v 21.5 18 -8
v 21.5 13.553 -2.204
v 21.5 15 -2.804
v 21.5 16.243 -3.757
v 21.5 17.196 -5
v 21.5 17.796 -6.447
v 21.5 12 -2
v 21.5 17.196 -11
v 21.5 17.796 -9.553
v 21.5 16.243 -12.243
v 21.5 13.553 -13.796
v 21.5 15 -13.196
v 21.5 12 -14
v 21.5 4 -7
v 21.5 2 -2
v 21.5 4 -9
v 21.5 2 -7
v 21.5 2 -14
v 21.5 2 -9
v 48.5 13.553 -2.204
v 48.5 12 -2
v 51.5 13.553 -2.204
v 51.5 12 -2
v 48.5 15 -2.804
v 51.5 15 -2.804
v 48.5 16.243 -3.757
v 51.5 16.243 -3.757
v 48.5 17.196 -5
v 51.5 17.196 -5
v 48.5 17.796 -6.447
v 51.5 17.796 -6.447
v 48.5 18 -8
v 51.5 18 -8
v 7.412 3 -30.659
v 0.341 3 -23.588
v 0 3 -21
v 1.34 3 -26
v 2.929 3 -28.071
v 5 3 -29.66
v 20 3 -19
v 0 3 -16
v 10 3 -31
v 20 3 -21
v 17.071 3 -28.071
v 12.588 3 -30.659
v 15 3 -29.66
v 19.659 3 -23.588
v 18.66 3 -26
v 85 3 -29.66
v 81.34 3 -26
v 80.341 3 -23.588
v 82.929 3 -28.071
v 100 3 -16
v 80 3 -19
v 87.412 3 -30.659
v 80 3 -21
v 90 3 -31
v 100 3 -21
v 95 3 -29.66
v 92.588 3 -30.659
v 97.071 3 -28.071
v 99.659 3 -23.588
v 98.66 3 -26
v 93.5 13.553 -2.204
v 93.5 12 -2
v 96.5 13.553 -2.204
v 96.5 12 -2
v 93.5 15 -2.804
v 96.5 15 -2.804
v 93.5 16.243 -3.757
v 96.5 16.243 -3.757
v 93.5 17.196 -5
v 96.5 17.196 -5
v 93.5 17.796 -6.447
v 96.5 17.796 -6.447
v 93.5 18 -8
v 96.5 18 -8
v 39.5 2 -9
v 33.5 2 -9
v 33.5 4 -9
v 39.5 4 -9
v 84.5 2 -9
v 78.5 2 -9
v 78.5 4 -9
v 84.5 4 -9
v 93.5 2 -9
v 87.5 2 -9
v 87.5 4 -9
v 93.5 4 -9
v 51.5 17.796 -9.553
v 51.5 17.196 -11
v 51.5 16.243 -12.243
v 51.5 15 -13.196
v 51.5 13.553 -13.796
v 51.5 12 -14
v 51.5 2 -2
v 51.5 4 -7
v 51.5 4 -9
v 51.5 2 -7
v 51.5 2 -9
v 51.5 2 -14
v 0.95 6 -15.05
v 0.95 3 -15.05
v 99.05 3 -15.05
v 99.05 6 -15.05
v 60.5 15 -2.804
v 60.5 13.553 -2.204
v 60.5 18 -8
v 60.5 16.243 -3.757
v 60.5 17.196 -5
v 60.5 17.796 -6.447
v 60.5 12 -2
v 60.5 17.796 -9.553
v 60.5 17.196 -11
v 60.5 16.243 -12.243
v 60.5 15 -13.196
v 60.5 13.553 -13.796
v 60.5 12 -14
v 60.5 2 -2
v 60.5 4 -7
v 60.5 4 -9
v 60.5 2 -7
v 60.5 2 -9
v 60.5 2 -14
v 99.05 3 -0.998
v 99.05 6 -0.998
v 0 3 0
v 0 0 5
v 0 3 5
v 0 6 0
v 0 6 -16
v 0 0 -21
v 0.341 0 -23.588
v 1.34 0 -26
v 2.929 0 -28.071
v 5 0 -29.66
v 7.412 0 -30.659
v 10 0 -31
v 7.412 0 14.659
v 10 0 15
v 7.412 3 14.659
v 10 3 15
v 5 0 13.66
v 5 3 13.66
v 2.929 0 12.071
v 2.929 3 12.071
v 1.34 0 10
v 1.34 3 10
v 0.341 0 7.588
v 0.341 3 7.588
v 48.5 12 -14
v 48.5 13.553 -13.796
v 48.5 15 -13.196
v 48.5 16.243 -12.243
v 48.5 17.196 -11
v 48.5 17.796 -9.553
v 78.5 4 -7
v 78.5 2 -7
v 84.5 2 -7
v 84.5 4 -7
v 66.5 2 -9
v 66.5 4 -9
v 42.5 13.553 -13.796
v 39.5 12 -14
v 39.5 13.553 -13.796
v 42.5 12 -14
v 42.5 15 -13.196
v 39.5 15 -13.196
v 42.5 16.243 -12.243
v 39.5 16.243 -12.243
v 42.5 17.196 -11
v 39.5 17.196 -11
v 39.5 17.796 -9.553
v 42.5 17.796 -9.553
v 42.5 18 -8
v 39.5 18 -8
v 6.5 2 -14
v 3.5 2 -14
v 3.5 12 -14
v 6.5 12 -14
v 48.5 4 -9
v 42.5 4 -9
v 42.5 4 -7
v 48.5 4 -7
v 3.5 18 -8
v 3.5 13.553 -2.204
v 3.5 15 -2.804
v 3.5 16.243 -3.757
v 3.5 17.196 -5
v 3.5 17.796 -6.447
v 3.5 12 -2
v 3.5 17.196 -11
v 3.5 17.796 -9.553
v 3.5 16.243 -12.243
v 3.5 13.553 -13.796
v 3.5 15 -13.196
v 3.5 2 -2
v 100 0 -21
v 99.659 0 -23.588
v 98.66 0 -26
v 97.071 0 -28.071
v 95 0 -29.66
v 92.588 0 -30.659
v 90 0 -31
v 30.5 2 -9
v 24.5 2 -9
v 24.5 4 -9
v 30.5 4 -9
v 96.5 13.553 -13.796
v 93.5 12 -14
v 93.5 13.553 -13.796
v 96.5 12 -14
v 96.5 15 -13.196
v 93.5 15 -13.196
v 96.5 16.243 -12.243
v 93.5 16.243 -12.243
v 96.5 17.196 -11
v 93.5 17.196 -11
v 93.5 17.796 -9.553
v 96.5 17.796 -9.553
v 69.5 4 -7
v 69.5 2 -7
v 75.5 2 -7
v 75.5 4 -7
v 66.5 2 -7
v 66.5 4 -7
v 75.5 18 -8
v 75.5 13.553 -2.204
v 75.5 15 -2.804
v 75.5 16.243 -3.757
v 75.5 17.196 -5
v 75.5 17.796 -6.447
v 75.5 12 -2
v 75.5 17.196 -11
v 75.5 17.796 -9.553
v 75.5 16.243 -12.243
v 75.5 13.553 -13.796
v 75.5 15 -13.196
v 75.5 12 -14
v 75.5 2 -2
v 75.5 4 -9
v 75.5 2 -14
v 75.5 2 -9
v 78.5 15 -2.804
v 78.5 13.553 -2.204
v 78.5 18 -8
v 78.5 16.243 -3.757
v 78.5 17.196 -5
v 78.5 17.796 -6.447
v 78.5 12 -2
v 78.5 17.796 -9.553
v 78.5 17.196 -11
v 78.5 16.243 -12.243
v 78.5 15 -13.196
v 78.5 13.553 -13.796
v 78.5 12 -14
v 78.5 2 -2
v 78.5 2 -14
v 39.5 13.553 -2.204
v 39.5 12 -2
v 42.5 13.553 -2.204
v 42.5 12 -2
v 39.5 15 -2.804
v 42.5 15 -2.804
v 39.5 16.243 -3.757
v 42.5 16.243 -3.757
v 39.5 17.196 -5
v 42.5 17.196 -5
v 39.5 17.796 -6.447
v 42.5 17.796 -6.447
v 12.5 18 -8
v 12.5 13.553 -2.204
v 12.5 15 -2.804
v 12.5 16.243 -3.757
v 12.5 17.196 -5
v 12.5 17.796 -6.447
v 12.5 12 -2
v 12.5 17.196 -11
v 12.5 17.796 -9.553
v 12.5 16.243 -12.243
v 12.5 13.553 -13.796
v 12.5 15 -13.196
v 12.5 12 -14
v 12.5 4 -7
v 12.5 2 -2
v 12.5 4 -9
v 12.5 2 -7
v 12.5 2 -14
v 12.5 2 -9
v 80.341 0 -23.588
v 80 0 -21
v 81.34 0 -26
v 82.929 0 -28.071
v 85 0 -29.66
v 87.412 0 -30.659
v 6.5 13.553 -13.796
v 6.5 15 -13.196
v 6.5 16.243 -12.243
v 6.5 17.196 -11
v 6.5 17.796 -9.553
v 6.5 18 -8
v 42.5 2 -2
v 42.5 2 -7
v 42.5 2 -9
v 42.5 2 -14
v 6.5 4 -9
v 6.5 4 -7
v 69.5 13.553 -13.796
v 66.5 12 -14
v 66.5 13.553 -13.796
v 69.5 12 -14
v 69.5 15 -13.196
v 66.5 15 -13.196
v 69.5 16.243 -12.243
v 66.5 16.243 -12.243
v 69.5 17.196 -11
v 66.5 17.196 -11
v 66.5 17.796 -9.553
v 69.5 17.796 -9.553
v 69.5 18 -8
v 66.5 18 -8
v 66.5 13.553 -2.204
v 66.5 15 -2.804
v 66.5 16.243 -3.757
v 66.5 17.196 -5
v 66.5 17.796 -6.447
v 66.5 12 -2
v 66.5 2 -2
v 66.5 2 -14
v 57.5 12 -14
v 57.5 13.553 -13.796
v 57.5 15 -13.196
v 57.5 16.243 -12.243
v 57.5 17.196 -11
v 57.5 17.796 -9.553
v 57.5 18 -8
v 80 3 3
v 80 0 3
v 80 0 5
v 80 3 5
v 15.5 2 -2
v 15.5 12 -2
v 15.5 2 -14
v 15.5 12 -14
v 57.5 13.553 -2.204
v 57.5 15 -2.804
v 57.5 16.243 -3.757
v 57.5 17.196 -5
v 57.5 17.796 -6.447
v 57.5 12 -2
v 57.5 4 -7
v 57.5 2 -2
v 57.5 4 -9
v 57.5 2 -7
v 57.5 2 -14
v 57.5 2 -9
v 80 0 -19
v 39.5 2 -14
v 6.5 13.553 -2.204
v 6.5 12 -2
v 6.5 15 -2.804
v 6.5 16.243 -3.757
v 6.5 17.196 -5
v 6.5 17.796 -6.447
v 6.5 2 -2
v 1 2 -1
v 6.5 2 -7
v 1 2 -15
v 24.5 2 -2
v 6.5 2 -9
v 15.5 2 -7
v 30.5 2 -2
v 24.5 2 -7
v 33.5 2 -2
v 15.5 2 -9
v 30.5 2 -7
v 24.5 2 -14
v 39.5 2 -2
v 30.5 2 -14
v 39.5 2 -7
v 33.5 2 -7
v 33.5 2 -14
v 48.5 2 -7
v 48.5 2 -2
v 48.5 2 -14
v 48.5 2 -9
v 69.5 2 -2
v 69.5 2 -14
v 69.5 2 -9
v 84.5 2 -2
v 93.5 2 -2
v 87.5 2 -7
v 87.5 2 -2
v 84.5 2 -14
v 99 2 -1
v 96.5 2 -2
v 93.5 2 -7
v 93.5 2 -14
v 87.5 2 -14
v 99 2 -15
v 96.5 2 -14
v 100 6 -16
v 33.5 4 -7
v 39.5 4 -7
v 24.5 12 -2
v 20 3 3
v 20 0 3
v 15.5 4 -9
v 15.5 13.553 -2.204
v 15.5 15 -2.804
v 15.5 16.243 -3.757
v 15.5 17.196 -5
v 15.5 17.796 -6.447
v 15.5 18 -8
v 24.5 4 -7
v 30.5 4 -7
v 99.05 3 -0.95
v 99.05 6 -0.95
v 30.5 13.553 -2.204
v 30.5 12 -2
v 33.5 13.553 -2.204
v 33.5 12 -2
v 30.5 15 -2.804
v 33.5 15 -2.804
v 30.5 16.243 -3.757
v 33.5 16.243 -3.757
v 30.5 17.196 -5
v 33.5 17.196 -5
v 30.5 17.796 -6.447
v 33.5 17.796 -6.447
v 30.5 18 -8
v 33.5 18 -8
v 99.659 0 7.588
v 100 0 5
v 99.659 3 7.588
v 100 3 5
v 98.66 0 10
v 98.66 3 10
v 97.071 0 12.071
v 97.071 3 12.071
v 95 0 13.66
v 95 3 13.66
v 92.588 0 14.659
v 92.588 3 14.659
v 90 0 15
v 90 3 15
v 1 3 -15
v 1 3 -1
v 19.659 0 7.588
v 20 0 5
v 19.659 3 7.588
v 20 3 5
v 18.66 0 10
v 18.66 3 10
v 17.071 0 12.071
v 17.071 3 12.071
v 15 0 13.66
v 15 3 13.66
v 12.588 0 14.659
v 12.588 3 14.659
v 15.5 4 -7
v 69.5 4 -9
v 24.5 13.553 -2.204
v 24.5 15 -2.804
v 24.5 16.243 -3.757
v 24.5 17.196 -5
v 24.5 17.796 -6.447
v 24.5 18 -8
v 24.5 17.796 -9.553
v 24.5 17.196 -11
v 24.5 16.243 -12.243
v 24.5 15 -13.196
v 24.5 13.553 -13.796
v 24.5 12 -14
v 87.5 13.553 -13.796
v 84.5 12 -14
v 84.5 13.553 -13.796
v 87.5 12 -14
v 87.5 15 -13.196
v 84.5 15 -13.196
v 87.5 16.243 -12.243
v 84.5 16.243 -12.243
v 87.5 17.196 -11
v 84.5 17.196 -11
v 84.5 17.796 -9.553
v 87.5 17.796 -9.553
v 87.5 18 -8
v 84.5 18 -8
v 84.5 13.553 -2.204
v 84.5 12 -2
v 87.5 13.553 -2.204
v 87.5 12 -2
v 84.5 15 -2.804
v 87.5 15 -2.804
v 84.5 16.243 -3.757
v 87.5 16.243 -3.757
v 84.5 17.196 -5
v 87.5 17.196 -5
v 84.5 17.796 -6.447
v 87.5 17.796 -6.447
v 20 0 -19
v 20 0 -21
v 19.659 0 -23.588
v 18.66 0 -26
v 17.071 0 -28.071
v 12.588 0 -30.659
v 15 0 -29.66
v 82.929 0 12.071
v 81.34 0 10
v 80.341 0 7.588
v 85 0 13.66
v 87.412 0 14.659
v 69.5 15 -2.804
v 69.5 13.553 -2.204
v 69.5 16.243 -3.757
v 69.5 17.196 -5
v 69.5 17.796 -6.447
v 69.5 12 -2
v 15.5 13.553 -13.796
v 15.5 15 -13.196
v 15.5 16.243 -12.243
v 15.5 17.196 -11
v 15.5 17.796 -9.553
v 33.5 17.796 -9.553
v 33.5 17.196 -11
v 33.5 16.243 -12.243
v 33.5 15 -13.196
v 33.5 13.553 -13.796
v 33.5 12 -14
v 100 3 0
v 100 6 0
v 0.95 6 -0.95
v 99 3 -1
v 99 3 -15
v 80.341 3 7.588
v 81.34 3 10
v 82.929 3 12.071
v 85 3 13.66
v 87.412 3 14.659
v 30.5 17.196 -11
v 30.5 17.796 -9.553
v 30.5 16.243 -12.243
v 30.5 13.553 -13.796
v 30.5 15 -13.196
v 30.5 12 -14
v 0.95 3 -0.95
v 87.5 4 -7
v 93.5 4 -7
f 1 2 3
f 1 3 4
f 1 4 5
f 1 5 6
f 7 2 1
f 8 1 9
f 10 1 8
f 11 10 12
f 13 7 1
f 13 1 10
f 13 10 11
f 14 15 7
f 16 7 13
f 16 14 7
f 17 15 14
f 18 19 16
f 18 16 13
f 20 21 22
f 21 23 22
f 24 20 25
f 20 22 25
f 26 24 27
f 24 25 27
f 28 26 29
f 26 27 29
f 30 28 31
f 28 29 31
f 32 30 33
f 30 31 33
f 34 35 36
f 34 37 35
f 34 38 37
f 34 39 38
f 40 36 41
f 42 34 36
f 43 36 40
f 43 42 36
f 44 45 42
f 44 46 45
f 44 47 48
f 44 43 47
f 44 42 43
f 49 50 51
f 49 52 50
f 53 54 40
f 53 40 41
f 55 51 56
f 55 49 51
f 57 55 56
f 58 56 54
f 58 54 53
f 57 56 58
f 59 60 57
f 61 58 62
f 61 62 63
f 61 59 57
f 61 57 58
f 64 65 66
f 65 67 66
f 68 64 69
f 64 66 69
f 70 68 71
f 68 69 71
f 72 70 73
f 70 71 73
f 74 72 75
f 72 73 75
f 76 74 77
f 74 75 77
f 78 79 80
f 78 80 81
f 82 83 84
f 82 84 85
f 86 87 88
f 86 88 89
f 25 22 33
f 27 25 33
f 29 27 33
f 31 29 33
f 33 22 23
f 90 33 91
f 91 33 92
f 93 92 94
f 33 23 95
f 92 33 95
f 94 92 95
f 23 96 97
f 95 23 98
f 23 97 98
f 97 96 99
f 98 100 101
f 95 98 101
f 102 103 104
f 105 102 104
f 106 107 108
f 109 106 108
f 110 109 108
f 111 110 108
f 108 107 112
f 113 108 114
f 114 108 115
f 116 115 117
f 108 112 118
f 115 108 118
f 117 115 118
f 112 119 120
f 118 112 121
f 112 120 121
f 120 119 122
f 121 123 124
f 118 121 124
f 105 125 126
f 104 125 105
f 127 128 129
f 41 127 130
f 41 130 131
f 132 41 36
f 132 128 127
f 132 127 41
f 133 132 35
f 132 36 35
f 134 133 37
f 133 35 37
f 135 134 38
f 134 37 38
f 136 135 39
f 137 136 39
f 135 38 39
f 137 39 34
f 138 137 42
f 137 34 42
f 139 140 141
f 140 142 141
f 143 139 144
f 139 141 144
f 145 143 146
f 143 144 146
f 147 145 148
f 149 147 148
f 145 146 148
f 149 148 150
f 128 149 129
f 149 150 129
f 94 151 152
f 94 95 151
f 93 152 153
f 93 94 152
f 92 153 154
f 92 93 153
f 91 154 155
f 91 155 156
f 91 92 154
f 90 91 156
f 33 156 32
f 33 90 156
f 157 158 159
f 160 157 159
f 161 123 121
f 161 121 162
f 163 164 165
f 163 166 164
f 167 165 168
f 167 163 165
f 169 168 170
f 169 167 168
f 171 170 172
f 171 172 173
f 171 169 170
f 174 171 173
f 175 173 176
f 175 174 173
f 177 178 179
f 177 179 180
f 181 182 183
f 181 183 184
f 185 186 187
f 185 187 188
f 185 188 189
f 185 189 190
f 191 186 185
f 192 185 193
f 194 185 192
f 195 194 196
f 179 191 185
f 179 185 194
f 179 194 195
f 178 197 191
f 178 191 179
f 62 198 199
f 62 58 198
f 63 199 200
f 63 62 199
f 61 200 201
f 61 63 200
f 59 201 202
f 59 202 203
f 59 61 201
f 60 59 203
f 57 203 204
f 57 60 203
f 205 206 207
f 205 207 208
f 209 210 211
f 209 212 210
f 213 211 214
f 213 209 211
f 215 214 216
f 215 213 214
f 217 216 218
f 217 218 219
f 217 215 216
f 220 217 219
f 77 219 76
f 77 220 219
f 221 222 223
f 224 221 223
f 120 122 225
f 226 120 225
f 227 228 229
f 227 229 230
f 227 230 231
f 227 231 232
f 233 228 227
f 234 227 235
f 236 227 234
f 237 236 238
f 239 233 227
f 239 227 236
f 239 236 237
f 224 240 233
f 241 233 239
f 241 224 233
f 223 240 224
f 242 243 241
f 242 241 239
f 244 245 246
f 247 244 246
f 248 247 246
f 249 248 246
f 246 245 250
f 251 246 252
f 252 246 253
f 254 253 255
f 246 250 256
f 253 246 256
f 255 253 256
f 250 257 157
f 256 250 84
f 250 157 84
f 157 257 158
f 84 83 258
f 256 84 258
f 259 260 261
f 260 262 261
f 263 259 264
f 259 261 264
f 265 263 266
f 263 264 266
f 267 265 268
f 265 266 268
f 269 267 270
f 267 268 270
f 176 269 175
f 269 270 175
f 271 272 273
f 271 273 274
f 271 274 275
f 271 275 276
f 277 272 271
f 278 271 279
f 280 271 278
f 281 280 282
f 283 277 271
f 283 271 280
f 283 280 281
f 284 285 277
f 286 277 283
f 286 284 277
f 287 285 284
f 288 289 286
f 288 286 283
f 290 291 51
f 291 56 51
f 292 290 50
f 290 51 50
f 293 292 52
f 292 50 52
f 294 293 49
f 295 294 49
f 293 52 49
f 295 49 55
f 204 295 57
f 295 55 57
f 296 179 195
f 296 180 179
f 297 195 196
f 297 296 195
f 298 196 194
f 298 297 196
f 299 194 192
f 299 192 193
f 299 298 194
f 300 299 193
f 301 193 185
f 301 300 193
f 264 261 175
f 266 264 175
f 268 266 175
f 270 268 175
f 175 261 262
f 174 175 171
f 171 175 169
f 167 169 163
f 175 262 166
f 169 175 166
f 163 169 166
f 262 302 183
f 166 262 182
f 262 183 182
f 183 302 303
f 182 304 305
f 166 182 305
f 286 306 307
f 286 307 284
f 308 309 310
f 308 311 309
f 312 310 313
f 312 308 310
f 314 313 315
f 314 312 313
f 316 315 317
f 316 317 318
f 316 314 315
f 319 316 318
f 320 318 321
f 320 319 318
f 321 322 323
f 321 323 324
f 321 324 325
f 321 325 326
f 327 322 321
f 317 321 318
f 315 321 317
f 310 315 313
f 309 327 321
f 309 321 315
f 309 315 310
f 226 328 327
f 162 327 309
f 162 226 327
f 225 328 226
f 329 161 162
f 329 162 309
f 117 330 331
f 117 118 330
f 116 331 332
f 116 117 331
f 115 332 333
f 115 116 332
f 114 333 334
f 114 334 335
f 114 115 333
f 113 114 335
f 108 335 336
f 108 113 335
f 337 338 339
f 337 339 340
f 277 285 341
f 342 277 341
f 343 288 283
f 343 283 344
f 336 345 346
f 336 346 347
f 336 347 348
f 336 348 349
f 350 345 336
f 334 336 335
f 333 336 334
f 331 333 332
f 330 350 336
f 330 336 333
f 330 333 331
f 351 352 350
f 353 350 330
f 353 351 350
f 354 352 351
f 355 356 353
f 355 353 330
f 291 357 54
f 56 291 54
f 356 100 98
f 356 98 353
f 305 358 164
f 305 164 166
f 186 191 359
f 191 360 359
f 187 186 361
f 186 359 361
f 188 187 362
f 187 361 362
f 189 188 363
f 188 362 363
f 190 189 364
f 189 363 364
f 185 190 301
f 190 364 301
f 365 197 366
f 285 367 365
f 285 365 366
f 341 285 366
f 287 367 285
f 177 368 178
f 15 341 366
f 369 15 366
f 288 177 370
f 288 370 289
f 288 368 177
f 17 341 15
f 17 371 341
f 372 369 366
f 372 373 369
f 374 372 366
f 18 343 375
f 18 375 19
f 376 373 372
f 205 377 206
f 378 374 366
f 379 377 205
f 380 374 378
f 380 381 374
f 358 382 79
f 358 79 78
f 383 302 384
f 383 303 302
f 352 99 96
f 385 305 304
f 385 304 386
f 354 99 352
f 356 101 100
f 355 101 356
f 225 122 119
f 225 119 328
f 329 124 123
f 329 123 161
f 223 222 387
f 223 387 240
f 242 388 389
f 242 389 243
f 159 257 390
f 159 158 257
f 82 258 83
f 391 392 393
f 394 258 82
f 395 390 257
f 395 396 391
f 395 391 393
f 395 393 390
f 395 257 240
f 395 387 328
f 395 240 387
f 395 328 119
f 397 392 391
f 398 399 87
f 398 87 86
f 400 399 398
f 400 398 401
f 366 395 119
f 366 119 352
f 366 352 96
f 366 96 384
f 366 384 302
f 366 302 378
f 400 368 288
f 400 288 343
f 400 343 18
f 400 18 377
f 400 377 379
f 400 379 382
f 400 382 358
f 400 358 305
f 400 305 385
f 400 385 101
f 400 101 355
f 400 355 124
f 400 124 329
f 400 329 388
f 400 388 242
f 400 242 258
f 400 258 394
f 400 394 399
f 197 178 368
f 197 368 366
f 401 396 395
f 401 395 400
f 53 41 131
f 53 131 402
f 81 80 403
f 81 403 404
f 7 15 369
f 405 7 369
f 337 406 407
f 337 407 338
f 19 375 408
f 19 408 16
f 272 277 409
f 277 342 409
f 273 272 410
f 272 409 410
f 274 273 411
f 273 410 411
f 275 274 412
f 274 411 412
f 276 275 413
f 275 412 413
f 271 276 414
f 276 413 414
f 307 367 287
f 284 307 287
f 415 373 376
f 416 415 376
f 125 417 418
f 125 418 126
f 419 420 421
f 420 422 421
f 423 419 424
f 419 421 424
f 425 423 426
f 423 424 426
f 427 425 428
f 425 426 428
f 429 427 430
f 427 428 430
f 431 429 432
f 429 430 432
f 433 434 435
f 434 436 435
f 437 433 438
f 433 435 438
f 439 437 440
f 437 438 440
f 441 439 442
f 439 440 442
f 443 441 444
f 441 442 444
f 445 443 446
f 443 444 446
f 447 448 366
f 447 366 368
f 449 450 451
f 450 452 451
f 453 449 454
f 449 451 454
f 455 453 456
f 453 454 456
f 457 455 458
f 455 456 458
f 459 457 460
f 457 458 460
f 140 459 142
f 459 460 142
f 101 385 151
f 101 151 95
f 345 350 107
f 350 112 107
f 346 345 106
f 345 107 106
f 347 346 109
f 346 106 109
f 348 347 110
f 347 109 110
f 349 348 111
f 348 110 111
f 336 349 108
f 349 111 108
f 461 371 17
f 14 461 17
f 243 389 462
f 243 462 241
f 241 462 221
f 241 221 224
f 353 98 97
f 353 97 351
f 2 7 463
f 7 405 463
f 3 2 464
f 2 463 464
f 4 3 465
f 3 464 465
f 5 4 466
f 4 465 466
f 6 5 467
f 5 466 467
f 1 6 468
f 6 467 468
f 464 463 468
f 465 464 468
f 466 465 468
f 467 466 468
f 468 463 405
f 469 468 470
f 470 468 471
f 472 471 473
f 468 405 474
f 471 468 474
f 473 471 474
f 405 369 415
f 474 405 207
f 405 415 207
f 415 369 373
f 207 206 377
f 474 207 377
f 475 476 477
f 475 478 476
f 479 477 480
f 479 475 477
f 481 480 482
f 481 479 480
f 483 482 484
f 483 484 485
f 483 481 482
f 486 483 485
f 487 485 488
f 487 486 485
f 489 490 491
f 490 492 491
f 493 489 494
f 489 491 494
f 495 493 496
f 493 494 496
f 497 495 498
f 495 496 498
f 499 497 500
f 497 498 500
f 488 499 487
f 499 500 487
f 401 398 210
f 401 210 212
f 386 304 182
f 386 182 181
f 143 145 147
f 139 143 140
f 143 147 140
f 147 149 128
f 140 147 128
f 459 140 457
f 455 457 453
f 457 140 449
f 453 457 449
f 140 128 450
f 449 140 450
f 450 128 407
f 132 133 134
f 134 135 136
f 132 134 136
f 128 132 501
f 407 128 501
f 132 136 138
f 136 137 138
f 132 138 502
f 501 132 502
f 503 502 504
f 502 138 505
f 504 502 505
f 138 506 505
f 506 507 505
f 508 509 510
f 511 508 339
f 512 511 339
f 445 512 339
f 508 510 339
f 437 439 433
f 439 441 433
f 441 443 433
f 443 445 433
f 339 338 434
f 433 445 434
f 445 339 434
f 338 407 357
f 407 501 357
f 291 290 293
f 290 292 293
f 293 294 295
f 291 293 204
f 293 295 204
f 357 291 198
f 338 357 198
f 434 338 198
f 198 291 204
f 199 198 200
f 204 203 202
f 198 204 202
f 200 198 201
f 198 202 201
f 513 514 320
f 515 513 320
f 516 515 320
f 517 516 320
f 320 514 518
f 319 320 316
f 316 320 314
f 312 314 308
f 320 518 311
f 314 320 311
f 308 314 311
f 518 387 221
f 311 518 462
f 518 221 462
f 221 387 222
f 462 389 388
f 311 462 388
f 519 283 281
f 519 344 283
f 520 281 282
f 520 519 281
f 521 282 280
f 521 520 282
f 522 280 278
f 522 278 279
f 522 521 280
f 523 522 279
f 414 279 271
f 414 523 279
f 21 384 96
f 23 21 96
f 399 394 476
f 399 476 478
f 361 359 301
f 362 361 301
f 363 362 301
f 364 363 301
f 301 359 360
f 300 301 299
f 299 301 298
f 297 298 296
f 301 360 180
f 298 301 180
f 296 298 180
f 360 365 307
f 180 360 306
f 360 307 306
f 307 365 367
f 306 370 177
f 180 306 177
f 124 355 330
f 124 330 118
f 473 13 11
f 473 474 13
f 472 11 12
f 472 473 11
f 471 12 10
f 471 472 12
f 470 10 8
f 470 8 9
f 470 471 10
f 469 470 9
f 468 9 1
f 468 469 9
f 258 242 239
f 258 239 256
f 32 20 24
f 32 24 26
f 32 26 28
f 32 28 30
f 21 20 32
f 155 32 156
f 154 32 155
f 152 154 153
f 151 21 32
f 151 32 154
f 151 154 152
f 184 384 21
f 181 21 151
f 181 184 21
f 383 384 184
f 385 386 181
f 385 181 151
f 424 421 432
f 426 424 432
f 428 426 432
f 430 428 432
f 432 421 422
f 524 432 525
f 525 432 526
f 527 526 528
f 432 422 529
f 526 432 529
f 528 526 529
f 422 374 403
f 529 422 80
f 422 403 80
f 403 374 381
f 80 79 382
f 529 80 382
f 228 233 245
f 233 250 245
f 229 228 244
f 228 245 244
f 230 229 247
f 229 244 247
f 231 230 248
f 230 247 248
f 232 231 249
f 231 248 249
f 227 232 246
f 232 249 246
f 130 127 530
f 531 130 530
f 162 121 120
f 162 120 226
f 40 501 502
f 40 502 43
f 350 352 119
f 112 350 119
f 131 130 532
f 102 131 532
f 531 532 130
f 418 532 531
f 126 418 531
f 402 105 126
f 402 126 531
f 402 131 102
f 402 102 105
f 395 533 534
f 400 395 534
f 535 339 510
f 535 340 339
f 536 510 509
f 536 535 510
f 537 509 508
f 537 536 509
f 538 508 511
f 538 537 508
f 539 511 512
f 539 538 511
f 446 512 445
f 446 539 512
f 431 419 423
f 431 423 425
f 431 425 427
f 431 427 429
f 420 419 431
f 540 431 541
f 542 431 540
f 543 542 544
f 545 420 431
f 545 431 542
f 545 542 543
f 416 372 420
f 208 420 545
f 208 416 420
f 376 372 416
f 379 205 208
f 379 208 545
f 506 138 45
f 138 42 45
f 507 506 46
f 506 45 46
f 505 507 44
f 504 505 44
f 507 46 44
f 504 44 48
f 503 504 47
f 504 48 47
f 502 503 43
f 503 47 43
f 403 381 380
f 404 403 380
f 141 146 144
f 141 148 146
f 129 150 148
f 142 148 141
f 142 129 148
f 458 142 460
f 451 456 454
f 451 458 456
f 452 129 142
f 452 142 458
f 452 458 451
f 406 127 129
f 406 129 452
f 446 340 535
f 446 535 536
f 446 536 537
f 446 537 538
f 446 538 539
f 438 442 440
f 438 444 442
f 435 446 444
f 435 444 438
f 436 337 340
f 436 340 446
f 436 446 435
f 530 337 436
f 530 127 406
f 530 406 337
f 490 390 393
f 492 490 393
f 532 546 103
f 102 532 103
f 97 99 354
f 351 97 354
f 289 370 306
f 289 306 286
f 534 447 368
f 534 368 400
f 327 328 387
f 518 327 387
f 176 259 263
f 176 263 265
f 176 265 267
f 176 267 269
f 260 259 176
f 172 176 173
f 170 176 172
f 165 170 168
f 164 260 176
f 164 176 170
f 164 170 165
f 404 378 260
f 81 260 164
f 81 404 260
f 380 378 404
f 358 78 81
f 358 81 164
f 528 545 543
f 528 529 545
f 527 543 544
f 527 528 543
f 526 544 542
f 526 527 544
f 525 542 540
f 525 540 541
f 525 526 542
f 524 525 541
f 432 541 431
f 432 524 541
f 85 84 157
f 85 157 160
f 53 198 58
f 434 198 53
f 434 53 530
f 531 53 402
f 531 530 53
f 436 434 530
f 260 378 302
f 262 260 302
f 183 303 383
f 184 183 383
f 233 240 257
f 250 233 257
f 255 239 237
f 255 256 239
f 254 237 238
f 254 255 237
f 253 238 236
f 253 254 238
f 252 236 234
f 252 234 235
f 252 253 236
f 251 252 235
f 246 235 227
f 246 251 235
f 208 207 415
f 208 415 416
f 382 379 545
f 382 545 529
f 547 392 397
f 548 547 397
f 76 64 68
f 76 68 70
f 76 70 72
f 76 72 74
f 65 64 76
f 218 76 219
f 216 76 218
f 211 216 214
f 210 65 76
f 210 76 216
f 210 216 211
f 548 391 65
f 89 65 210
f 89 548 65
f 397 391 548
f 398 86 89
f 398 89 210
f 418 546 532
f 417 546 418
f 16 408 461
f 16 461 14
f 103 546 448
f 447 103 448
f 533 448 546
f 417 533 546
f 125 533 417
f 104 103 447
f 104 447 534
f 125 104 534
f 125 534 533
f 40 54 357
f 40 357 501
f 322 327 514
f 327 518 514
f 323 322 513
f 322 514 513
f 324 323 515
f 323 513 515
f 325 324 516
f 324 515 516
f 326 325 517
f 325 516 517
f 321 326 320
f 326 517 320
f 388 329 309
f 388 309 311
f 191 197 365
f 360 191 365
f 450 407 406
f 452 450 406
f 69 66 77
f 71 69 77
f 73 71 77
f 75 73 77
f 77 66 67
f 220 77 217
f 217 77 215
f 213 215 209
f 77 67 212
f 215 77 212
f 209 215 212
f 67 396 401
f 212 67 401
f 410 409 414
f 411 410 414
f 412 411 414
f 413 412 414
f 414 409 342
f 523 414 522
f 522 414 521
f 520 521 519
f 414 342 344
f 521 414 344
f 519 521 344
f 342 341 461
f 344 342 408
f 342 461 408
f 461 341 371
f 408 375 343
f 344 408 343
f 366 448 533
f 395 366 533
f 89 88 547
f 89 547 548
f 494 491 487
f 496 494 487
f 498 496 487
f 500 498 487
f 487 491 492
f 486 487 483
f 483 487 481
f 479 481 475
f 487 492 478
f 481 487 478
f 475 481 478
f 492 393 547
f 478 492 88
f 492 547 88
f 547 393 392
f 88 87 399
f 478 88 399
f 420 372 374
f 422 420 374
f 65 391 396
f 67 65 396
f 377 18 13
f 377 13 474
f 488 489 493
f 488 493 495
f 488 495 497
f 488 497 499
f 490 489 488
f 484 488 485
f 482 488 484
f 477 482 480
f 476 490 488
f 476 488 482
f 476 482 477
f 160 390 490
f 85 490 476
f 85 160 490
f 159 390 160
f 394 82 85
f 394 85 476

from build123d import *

# Parameters (mm, degrees)
SKETCH1_W            = 100
SKETCH1_H            = 16
BOSS_EXTRUDE1_DEPTH  = 3
SKETCH2_W            = 98
SKETCH2_H            = 14
CUT_EXTRUDE1_DEPTH   = 1
SKETCH5_W            = 20
SKETCH5_H            = 3
BOSS_EXTRUDE4_DEPTH  = 15
SKETCH6_W            = 20
SKETCH6_H            = 3
BOSS_EXTRUDE5_DEPTH  = 15
FILLET18_R           = 10
SKETCH7_W            = 3
SKETCH7_H            = 12
BOSS_EXTRUDE6_DEPTH  = 16
SKETCH8_W            = 6
SKETCH8_H            = 2
BOSS_EXTRUDE7_DEPTH  = 2
FILLET19_R           = 6
SKETCH10_W           = 60
SKETCH10_H           = 3
BOSS_EXTRUDE8_DEPTH  = 3
SKETCH11_W           = 60
SKETCH11_H           = 3
BOSS_EXTRUDE9_DEPTH  = 3
SKETCH12_W           = 0.95
SKETCH12_H           = 14
BOSS_EXTRUDE10_DEPTH = 3
SKETCH13_W           = 100
SKETCH13_H           = 0.95
BOSS_EXTRUDE11_DEPTH = 3
SKETCH14_W           = 0.95
SKETCH14_H           = 0.052088128
BOSS_EXTRUDE12_DEPTH = 3
SKETCH15_W           = 0.95
SKETCH15_H           = 0.047911872
SKETCH15_W_2         = 0.949734752
SKETCH15_H_2         = 0.052088128
BOSS_EXTRUDE13_DEPTH = 3


with BuildPart() as part:
    # Sketch1 → Boss-Extrude1 (new body)
    with BuildSketch(Plane(origin=(0, 0, 0), x_dir=(1, 0, 0), z_dir=(0, 1, 0))):
        with Locations((50, 8)):
            Rectangle(SKETCH1_W, SKETCH1_H)
    extrude(amount=BOSS_EXTRUDE1_DEPTH)

    # Sketch2 → Cut-Extrude1 (cut)
    with BuildSketch(Plane(origin=(0, 3, 0), x_dir=(1, 0, 0), z_dir=(0, 1, 0))):
        with Locations((50, 8)):
            Rectangle(SKETCH2_W, SKETCH2_H)
    extrude(amount=-CUT_EXTRUDE1_DEPTH, mode=Mode.SUBTRACT)

    # Sketch5 → Boss-Extrude4 (add)
    with BuildSketch(Plane.XY):
        with Locations((10, 1.5)):
            Rectangle(SKETCH5_W, SKETCH5_H)
        with Locations((90, 1.5)):
            Rectangle(SKETCH5_W, SKETCH5_H)
    extrude(amount=BOSS_EXTRUDE4_DEPTH)

    # Sketch6 → Boss-Extrude5 (add)
    with BuildSketch(Plane(origin=(0, 0, -16), x_dir=(-1, 0, 0), z_dir=(0, 0, -1))):
        with Locations((-90, 1.5)):
            Rectangle(SKETCH6_W, SKETCH6_H)
        with Locations((-10, 1.5)):
            Rectangle(SKETCH6_W, SKETCH6_H)
    extrude(amount=BOSS_EXTRUDE5_DEPTH)

    # Fillet18
    fillet18_edges = [part.edges().sort_by_distance(p)[0] for p in [
        (20, 1.5, 15),
        (0, 1.5, 15),
        (80, 1.5, 15),
        (100, 1.5, 15),
        (0, 1.5, -31),
        (20, 1.5, -31),
        (80, 1.5, -31),
        (100, 1.5, -31),
    ]]
    fillet(fillet18_edges, radius=FILLET18_R - 0.0001)  # a hair under: the kernel refuses the full size

    # Sketch7 → Boss-Extrude6 (add)
    with BuildSketch(Plane(origin=(0, 2, 0), x_dir=(1, 0, 0), z_dir=(0, 1, 0))):
        with Locations((95, 8)):
            Rectangle(SKETCH7_W, SKETCH7_H)
        with Locations((86, 8)):
            Rectangle(SKETCH7_W, SKETCH7_H)
        with Locations((77, 8)):
            Rectangle(SKETCH7_W, SKETCH7_H)
        with Locations((68, 8)):
            Rectangle(SKETCH7_W, SKETCH7_H)
        with Locations((59, 8)):
            Rectangle(SKETCH7_W, SKETCH7_H)
        with Locations((50, 8)):
            Rectangle(SKETCH7_W, SKETCH7_H)
        with Locations((41, 8)):
            Rectangle(SKETCH7_W, SKETCH7_H)
        with Locations((32, 8)):
            Rectangle(SKETCH7_W, SKETCH7_H)
        with Locations((23, 8)):
            Rectangle(SKETCH7_W, SKETCH7_H)
        with Locations((14, 8)):
            Rectangle(SKETCH7_W, SKETCH7_H)
        with Locations((5, 8)):
            Rectangle(SKETCH7_W, SKETCH7_H)
    extrude(amount=BOSS_EXTRUDE6_DEPTH)

    # Sketch8 → Boss-Extrude7 (add)
    with BuildSketch(Plane(origin=(0, 2, 0), x_dir=(1, 0, 0), z_dir=(0, 1, 0))):
        with Locations((90.5, 8)):
            Rectangle(SKETCH8_W, SKETCH8_H)
        with Locations((81.5, 8)):
            Rectangle(SKETCH8_W, SKETCH8_H)
        with Locations((72.5, 8)):
            Rectangle(SKETCH8_W, SKETCH8_H)
        with Locations((63.5, 8)):
            Rectangle(SKETCH8_W, SKETCH8_H)
        with Locations((54.5, 8)):
            Rectangle(SKETCH8_W, SKETCH8_H)
        with Locations((45.5, 8)):
            Rectangle(SKETCH8_W, SKETCH8_H)
        with Locations((36.5, 8)):
            Rectangle(SKETCH8_W, SKETCH8_H)
        with Locations((27.5, 8)):
            Rectangle(SKETCH8_W, SKETCH8_H)
        with Locations((18.5, 8)):
            Rectangle(SKETCH8_W, SKETCH8_H)
        with Locations((9.5, 8)):
            Rectangle(SKETCH8_W, SKETCH8_H)
    extrude(amount=BOSS_EXTRUDE7_DEPTH)

    # Fillet19
    fillet19_edges = [part.edges().sort_by_distance(p)[0] for p in [
        (95, 18, -2),
        (95, 18, -14),
        (86, 18, -2),
        (86, 18, -14),
        (77, 18, -2),
        (77, 18, -14),
        (68, 18, -2),
        (68, 18, -14),
        (59, 18, -2),
        (59, 18, -14),
        (50, 18, -2),
        (50, 18, -14),
        (41, 18, -2),
        (41, 18, -14),
        (32, 18, -2),
        (32, 18, -14),
        (23, 18, -14),
        (23, 18, -2),
        (14, 18, -2),
        (14, 18, -14),
        (5, 18, -2),
        (5, 18, -14),
    ]]
    fillet(fillet19_edges, radius=FILLET19_R - 0.0001)  # a hair under: the kernel refuses the full size

    # Sketch10 → Boss-Extrude8 (add)
    with BuildSketch(Plane(origin=(0, 0, -16), x_dir=(-1, 0, 0), z_dir=(0, 0, -1))):
        with Locations((-50, 1.5)):
            Rectangle(SKETCH10_W, SKETCH10_H)
    extrude(amount=BOSS_EXTRUDE8_DEPTH)

    # Sketch11 → Boss-Extrude9 (add)
    with BuildSketch(Plane.XY):
        with Locations((50, 1.5)):
            Rectangle(SKETCH11_W, SKETCH11_H)
    extrude(amount=BOSS_EXTRUDE9_DEPTH)

    # Sketch12 → Boss-Extrude10 (add)
    with BuildSketch(Plane(origin=(0, 3, 0), x_dir=(1, 0, 0), z_dir=(0, 1, 0))):
        with Locations((99.525, 7.997911872)):
            Rectangle(SKETCH12_W, SKETCH12_H)
        with Locations((0.475, 7.997911872)):
            Rectangle(SKETCH12_W, SKETCH12_H)
    extrude(amount=BOSS_EXTRUDE10_DEPTH)

    # Sketch13 → Boss-Extrude11 (add)
    with BuildSketch(Plane(origin=(0, 3, 0), x_dir=(1, 0, 0), z_dir=(0, 1, 0))):
        with Locations((50, 15.525)):
            Rectangle(SKETCH13_W, SKETCH13_H)
        with Locations((50, 0.475)):
            Rectangle(SKETCH13_W, SKETCH13_H)
    extrude(amount=BOSS_EXTRUDE11_DEPTH)

    # Sketch14 → Boss-Extrude12 (add)
    with BuildSketch(Plane(origin=(0, 3, 0), x_dir=(1, 0, 0), z_dir=(0, 1, 0))):
        with Locations((0.475, 15.023955936)):
            Rectangle(SKETCH14_W, SKETCH14_H)
    extrude(amount=BOSS_EXTRUDE12_DEPTH)

    # Sketch15 → Boss-Extrude13 (add)
    with BuildSketch(Plane(origin=(0, 3, 0), x_dir=(1, 0, 0), z_dir=(0, 1, 0))):
        with Locations((0.475, 0.973955936)):
            Rectangle(SKETCH15_W, SKETCH15_H)
        with Locations((99.525132624, 0.973955936)):
            Rectangle(SKETCH15_W_2, SKETCH15_H)
        with Locations((99.525, 15.023955936)):
            Rectangle(SKETCH15_W, SKETCH15_H_2)
    extrude(amount=BOSS_EXTRUDE13_DEPTH)


solid = part.part
